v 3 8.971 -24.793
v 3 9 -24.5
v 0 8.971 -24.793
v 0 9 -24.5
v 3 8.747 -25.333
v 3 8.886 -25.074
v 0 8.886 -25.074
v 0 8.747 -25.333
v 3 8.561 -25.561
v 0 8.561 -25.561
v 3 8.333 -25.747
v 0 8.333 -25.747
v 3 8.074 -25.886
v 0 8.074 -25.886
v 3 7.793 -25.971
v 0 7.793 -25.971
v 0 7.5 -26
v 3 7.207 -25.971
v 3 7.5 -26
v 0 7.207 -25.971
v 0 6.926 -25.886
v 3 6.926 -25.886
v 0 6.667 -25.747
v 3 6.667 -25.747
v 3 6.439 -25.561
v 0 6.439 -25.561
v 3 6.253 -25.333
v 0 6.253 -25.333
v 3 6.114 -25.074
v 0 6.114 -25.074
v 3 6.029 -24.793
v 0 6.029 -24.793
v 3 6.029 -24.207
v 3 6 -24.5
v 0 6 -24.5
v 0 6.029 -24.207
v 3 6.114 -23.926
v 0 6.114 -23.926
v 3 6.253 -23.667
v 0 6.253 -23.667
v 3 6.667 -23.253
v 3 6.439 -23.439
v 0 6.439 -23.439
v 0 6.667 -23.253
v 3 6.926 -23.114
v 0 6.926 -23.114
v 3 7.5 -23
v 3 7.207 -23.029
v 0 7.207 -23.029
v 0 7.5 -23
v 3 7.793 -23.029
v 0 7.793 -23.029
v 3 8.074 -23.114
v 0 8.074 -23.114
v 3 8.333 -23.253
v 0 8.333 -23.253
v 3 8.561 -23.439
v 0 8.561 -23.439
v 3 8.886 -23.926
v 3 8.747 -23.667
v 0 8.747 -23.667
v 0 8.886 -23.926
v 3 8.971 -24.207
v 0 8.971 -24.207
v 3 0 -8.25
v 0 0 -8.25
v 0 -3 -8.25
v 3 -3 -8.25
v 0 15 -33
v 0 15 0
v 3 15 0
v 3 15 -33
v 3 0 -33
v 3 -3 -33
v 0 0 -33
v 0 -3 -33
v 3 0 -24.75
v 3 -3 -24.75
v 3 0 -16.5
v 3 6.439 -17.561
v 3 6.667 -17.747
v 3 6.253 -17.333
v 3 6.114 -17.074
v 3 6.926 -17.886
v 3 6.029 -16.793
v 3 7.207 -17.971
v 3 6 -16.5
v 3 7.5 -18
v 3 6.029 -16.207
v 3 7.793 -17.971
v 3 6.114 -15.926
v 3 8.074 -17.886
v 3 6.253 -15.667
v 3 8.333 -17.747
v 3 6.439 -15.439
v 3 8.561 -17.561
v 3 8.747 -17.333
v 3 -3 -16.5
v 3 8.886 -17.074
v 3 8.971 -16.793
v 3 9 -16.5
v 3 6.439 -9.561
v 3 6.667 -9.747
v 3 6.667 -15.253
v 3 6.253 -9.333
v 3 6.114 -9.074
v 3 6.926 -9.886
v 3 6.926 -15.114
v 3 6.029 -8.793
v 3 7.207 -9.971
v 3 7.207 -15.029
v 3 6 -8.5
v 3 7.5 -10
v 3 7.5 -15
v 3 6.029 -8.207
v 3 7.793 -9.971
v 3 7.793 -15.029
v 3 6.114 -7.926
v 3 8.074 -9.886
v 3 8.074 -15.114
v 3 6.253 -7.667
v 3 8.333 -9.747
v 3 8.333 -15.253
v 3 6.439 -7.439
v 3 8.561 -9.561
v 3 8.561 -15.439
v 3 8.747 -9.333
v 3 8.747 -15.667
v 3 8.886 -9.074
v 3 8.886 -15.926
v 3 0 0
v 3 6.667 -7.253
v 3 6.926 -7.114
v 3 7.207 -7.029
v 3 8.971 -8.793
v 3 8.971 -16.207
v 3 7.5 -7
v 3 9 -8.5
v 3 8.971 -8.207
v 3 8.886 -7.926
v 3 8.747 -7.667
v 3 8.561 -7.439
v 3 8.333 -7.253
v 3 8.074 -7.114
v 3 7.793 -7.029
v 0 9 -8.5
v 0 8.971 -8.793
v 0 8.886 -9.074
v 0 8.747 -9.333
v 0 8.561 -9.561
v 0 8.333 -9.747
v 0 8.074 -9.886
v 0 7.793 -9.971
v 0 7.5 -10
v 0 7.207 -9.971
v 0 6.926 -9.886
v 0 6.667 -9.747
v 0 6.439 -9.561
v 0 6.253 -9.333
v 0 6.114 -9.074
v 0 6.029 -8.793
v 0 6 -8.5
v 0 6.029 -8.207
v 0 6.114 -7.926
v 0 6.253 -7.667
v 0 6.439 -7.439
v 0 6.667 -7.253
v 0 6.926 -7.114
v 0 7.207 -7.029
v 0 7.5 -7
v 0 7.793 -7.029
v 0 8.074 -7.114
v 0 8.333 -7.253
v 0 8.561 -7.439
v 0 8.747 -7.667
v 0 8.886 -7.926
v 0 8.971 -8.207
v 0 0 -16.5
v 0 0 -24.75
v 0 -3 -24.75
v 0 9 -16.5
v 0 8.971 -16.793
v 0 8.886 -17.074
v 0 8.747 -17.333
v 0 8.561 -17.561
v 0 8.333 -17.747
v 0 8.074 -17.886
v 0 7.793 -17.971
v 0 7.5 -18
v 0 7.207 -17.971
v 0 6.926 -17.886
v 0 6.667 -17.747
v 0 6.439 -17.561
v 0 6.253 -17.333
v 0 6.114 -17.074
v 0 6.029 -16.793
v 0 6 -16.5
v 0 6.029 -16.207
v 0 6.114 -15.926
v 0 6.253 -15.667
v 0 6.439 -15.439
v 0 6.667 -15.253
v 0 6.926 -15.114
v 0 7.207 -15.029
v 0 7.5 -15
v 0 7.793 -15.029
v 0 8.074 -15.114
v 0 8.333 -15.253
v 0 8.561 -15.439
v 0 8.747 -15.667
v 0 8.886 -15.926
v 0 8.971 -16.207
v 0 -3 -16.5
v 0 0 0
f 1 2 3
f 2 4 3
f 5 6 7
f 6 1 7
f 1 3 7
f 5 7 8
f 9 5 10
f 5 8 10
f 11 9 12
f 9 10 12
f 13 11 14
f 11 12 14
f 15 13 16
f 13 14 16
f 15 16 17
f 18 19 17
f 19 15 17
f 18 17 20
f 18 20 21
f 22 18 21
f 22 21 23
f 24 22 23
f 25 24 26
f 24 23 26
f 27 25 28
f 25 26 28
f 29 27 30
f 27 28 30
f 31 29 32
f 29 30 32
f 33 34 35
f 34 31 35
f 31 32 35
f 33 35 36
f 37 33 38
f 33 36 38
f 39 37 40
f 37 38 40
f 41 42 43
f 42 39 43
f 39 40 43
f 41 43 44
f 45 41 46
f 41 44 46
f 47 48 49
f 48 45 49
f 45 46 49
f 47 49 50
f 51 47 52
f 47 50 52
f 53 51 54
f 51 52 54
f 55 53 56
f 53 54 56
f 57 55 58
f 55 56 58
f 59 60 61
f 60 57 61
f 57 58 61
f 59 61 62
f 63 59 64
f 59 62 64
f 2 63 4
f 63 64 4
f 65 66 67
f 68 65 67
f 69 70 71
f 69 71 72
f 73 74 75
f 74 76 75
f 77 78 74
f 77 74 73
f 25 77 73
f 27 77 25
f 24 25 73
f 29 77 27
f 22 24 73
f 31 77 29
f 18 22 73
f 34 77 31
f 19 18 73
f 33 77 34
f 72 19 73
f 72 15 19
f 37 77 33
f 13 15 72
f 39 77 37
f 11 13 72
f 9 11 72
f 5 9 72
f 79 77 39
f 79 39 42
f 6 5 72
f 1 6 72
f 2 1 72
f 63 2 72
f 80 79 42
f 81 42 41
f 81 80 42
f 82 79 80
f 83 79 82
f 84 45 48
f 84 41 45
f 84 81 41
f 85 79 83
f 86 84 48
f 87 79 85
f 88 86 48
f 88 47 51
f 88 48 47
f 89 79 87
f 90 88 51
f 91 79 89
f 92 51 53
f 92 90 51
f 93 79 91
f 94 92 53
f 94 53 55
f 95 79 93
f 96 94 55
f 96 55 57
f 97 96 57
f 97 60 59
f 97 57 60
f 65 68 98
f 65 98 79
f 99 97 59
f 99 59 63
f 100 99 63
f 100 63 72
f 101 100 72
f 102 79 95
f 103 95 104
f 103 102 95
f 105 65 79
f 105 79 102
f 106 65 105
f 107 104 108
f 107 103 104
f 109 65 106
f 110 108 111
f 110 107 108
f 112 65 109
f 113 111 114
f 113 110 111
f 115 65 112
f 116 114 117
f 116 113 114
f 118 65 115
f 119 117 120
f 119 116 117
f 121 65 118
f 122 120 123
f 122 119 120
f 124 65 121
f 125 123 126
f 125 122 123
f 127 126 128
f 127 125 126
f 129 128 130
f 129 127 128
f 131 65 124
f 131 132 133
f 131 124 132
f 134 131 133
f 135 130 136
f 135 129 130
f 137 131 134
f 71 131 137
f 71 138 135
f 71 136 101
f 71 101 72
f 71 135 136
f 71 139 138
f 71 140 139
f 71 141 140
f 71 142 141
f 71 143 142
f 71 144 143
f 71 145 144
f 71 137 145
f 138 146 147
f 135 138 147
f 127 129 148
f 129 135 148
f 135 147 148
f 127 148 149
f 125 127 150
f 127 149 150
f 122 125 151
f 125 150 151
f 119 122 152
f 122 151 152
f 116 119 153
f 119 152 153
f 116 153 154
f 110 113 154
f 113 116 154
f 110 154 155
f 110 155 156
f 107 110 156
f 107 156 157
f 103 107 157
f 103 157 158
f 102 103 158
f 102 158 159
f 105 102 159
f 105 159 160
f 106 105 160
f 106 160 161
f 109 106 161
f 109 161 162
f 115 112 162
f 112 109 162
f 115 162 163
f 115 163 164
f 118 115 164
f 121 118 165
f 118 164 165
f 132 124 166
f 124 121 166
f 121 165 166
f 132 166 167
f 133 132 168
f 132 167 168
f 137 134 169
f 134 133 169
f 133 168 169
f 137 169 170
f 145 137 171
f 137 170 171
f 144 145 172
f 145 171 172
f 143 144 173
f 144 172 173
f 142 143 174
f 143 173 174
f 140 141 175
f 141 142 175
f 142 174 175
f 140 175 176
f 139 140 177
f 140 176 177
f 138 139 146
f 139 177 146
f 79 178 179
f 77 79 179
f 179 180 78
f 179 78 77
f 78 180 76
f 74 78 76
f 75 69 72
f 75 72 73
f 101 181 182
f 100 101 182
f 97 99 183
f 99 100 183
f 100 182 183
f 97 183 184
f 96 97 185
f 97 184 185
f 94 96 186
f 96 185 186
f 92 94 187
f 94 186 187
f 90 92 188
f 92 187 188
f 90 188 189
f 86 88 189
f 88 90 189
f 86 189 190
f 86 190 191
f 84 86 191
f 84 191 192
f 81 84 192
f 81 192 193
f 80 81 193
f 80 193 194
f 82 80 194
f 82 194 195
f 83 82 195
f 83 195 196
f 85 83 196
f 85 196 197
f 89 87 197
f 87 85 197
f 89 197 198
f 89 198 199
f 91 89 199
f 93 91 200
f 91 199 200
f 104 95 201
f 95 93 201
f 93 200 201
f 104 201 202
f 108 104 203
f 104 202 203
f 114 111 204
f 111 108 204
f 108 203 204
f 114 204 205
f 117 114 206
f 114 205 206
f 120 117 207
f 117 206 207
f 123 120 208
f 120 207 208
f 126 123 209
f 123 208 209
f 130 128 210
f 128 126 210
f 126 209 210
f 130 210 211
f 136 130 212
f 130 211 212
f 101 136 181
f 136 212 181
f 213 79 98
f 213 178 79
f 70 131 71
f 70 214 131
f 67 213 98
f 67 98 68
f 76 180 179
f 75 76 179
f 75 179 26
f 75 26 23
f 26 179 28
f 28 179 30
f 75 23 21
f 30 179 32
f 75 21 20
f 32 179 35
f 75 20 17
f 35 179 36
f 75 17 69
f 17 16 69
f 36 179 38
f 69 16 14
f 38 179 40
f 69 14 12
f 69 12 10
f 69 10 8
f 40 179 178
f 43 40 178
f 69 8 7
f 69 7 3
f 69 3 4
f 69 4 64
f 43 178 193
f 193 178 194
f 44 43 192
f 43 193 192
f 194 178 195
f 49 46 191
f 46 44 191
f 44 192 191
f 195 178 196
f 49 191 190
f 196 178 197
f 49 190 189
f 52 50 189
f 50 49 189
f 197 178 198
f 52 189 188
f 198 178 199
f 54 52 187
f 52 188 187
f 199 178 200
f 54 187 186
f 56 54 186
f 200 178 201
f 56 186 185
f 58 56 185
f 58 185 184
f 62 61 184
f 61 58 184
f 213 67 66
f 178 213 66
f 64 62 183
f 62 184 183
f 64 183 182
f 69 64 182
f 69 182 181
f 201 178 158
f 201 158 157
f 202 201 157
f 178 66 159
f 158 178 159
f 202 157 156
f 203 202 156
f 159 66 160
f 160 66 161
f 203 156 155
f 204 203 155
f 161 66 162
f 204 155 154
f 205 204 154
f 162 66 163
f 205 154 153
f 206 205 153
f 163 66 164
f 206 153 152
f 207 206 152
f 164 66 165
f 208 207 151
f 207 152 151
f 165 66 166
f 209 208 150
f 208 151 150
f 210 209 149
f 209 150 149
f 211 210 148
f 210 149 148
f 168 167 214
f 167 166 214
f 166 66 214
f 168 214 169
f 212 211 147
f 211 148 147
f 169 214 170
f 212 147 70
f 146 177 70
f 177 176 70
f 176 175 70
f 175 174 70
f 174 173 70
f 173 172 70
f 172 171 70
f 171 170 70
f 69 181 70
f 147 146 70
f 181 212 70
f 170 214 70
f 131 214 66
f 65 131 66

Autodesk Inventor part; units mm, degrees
ref_plane "YZ Plane" through (0, 0, 0) normal (1, 0, 0) x (0, 1, 0)
ref_plane "XZ Plane" through (0, 0, 0) normal (0, 1, 0) x (-1, 0, 0)
ref_plane "XY Plane" through (0, 0, 0) normal (0, 0, 1) x (1, 0, 0)
sketch "Boceto1" plane through (0, 0, 0) normal (1, 0, 0) x (0, 1, 0)
  line L0 (0, 0) -> (15, 0)
  line L1 (15, 0) -> (15, -33)
  line L2 (15, -33) -> (0, -33)
  circle A0 centre (7.5, -8.5) radius 1.5
  circle A1 centre (7.5, -24.5) radius 1.5
  circle A2 centre (7.5, -16.5) radius 1.5
  line L3 (0, -16.5) -> (-3, -16.5)
  line L4 (-3, -16.5) -> (-3, -8.25)
  line L5 (-3, -24.75) -> (-3, -33)
  line L6 (-3, -33) -> (0, -33)
  line L7 (0, -8.25) -> (-3, -8.25)
  line L8 (-3, -24.75) -> (0, -24.75)
  line L9 (0, 0) -> (0, -8.25)
  line L10 (0, -16.5) -> (0, -24.75)
  dimension "d0" = 33
  dimension "d4" = 3
  dimension "d5" = 3
  dimension "d6" = 3
  dimension "d8" = 8.25
  dimension "d9" = 8.25
  dimension "d10" = 8.25
  dimension "d11" = 8.25
extrude "Extrusión1" add sketch "Boceto1" along normal blind 3
properties part number "muñeca6"
